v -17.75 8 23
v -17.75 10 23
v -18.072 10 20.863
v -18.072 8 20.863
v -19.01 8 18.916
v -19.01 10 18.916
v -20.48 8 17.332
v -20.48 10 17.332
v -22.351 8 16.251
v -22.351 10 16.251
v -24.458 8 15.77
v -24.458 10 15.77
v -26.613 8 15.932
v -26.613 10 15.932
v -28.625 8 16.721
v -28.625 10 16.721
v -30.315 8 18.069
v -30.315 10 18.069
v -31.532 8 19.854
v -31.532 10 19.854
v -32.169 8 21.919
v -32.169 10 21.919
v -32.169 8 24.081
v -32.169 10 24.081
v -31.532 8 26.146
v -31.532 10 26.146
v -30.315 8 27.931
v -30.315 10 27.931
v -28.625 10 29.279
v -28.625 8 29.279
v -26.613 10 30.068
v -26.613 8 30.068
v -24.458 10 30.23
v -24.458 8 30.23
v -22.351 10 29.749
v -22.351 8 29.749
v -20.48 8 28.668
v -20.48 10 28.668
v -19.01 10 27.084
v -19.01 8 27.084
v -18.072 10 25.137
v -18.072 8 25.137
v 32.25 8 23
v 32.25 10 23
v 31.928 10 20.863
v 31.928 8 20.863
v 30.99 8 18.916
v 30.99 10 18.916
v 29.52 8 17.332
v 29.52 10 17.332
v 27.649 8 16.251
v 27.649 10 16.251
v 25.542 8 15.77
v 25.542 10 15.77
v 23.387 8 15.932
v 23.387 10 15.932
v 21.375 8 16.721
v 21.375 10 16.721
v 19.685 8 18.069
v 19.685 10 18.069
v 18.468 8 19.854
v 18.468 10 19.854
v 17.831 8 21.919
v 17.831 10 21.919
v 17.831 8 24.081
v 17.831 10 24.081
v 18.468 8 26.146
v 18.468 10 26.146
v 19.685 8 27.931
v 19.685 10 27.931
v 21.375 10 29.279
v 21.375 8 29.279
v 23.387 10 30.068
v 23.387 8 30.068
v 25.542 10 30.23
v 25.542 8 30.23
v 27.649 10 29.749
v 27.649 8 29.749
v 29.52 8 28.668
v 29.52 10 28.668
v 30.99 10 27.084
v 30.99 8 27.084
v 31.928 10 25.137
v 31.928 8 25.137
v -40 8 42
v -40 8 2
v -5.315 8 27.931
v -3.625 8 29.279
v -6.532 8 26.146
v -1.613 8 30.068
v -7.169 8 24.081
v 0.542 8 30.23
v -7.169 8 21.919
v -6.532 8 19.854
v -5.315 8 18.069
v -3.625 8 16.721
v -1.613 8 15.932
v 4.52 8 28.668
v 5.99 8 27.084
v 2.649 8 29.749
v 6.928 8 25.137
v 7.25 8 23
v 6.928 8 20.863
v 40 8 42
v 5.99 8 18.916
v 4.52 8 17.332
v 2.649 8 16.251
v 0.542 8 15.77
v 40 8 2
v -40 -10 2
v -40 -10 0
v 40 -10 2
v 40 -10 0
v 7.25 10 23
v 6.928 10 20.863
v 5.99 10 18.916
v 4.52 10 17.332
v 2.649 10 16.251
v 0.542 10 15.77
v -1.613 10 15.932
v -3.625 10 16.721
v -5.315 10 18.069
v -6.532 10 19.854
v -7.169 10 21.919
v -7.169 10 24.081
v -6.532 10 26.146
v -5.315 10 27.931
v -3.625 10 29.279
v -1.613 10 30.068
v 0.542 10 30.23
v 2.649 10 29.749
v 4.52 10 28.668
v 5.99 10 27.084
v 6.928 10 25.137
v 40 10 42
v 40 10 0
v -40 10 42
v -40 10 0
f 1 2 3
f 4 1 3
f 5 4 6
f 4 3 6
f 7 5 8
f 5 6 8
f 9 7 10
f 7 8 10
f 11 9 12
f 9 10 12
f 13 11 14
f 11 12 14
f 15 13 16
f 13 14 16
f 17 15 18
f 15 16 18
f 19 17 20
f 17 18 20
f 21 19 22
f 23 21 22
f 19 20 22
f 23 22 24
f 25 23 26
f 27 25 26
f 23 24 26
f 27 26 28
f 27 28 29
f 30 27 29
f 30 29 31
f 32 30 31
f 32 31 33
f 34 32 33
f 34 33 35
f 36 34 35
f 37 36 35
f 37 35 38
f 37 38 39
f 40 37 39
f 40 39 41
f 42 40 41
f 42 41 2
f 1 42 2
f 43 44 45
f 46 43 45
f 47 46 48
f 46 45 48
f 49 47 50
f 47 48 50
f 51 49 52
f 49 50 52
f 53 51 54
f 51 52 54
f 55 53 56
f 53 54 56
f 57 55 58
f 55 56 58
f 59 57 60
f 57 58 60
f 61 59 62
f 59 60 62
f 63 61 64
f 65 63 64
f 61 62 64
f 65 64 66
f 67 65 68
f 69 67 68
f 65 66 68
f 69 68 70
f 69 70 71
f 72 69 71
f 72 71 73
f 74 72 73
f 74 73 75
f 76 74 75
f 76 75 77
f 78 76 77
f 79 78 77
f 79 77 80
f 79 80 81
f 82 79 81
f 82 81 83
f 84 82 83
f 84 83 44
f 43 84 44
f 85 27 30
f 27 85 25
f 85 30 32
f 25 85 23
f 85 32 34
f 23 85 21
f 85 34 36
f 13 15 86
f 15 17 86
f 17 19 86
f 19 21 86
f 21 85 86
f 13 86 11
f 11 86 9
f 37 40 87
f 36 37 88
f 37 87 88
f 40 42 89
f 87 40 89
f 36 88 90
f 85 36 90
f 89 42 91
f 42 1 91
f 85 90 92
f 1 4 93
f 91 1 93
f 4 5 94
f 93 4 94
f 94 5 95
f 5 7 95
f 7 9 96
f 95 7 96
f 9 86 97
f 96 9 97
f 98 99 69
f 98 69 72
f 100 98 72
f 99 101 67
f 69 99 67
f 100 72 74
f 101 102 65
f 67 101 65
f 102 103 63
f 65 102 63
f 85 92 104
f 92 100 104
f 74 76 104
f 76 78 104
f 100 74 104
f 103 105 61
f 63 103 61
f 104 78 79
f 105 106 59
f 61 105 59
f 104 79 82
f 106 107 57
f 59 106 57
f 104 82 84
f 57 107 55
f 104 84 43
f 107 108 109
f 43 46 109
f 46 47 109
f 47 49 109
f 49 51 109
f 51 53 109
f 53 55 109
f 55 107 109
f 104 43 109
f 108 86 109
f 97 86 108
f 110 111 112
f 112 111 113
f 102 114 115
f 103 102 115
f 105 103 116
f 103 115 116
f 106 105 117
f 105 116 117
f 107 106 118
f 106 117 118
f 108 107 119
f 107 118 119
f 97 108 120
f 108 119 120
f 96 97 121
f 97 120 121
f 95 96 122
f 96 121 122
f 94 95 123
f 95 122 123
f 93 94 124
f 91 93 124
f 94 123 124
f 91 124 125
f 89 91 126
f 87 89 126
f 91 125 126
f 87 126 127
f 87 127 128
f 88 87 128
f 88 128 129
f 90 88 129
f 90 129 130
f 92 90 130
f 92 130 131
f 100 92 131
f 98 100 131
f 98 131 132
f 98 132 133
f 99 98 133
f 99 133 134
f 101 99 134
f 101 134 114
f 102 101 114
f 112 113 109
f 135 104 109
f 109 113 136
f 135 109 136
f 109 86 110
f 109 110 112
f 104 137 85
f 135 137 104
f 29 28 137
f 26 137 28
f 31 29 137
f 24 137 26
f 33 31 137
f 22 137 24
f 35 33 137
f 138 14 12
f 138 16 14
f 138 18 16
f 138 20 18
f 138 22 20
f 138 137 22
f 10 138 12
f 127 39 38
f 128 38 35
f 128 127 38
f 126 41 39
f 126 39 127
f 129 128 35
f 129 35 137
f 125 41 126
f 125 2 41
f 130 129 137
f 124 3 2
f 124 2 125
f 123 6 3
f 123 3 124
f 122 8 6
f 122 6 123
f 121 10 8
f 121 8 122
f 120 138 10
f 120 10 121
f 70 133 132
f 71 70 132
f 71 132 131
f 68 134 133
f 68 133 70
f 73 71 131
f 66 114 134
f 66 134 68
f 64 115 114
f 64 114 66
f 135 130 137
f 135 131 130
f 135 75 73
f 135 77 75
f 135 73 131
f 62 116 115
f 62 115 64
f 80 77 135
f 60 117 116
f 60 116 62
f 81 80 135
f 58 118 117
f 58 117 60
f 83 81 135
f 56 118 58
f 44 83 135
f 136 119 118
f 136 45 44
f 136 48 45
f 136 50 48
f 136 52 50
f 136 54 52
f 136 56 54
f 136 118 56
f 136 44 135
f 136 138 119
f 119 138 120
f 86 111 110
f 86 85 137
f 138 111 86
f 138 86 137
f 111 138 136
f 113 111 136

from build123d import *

# Parameters (mm, degrees)
IZIM1_W                     = 80
IZIM1_H                     = 20
Y_KSEKLIK_EKSTR_ZYON1_DEPTH = 42
BO_ALTMA1_T                 = -2
IZIM2_R                     = 7.25
KES_EKSTR_ZYON1_DEPTH       = 42


with BuildPart() as part:
    # Çizim1 → Yükseklik-Ekstrüzyon1 (new body)
    with BuildSketch(Plane.XY):
        Rectangle(IZIM1_W, IZIM1_H)
    extrude(amount=Y_KSEKLIK_EKSTR_ZYON1_DEPTH)

    # İç Boşaltma1
    bo_altma1_openings = [part.faces().sort_by_distance(p)[0] for p in [
        (0, 0, 42),
        (0, -10, 21),
        (-40, 0, 21),
        (40, 0, 21),
    ]]
    offset(amount=BO_ALTMA1_T, openings=bo_altma1_openings, kind=Kind.INTERSECTION)

    # Çizim2 → Kes-Ekstrüzyon1 (cut)
    with BuildSketch(Plane(origin=(0, 10, 0), x_dir=(1, 0, 0), z_dir=(0, 1, 0))):
        with Locations((0, -23)):
            Circle(IZIM2_R)
        with Locations((-25, -23)):
            Circle(IZIM2_R)
        with Locations((25, -23)):
            Circle(IZIM2_R)
    extrude(amount=-KES_EKSTR_ZYON1_DEPTH, mode=Mode.SUBTRACT)


solid = part.part
